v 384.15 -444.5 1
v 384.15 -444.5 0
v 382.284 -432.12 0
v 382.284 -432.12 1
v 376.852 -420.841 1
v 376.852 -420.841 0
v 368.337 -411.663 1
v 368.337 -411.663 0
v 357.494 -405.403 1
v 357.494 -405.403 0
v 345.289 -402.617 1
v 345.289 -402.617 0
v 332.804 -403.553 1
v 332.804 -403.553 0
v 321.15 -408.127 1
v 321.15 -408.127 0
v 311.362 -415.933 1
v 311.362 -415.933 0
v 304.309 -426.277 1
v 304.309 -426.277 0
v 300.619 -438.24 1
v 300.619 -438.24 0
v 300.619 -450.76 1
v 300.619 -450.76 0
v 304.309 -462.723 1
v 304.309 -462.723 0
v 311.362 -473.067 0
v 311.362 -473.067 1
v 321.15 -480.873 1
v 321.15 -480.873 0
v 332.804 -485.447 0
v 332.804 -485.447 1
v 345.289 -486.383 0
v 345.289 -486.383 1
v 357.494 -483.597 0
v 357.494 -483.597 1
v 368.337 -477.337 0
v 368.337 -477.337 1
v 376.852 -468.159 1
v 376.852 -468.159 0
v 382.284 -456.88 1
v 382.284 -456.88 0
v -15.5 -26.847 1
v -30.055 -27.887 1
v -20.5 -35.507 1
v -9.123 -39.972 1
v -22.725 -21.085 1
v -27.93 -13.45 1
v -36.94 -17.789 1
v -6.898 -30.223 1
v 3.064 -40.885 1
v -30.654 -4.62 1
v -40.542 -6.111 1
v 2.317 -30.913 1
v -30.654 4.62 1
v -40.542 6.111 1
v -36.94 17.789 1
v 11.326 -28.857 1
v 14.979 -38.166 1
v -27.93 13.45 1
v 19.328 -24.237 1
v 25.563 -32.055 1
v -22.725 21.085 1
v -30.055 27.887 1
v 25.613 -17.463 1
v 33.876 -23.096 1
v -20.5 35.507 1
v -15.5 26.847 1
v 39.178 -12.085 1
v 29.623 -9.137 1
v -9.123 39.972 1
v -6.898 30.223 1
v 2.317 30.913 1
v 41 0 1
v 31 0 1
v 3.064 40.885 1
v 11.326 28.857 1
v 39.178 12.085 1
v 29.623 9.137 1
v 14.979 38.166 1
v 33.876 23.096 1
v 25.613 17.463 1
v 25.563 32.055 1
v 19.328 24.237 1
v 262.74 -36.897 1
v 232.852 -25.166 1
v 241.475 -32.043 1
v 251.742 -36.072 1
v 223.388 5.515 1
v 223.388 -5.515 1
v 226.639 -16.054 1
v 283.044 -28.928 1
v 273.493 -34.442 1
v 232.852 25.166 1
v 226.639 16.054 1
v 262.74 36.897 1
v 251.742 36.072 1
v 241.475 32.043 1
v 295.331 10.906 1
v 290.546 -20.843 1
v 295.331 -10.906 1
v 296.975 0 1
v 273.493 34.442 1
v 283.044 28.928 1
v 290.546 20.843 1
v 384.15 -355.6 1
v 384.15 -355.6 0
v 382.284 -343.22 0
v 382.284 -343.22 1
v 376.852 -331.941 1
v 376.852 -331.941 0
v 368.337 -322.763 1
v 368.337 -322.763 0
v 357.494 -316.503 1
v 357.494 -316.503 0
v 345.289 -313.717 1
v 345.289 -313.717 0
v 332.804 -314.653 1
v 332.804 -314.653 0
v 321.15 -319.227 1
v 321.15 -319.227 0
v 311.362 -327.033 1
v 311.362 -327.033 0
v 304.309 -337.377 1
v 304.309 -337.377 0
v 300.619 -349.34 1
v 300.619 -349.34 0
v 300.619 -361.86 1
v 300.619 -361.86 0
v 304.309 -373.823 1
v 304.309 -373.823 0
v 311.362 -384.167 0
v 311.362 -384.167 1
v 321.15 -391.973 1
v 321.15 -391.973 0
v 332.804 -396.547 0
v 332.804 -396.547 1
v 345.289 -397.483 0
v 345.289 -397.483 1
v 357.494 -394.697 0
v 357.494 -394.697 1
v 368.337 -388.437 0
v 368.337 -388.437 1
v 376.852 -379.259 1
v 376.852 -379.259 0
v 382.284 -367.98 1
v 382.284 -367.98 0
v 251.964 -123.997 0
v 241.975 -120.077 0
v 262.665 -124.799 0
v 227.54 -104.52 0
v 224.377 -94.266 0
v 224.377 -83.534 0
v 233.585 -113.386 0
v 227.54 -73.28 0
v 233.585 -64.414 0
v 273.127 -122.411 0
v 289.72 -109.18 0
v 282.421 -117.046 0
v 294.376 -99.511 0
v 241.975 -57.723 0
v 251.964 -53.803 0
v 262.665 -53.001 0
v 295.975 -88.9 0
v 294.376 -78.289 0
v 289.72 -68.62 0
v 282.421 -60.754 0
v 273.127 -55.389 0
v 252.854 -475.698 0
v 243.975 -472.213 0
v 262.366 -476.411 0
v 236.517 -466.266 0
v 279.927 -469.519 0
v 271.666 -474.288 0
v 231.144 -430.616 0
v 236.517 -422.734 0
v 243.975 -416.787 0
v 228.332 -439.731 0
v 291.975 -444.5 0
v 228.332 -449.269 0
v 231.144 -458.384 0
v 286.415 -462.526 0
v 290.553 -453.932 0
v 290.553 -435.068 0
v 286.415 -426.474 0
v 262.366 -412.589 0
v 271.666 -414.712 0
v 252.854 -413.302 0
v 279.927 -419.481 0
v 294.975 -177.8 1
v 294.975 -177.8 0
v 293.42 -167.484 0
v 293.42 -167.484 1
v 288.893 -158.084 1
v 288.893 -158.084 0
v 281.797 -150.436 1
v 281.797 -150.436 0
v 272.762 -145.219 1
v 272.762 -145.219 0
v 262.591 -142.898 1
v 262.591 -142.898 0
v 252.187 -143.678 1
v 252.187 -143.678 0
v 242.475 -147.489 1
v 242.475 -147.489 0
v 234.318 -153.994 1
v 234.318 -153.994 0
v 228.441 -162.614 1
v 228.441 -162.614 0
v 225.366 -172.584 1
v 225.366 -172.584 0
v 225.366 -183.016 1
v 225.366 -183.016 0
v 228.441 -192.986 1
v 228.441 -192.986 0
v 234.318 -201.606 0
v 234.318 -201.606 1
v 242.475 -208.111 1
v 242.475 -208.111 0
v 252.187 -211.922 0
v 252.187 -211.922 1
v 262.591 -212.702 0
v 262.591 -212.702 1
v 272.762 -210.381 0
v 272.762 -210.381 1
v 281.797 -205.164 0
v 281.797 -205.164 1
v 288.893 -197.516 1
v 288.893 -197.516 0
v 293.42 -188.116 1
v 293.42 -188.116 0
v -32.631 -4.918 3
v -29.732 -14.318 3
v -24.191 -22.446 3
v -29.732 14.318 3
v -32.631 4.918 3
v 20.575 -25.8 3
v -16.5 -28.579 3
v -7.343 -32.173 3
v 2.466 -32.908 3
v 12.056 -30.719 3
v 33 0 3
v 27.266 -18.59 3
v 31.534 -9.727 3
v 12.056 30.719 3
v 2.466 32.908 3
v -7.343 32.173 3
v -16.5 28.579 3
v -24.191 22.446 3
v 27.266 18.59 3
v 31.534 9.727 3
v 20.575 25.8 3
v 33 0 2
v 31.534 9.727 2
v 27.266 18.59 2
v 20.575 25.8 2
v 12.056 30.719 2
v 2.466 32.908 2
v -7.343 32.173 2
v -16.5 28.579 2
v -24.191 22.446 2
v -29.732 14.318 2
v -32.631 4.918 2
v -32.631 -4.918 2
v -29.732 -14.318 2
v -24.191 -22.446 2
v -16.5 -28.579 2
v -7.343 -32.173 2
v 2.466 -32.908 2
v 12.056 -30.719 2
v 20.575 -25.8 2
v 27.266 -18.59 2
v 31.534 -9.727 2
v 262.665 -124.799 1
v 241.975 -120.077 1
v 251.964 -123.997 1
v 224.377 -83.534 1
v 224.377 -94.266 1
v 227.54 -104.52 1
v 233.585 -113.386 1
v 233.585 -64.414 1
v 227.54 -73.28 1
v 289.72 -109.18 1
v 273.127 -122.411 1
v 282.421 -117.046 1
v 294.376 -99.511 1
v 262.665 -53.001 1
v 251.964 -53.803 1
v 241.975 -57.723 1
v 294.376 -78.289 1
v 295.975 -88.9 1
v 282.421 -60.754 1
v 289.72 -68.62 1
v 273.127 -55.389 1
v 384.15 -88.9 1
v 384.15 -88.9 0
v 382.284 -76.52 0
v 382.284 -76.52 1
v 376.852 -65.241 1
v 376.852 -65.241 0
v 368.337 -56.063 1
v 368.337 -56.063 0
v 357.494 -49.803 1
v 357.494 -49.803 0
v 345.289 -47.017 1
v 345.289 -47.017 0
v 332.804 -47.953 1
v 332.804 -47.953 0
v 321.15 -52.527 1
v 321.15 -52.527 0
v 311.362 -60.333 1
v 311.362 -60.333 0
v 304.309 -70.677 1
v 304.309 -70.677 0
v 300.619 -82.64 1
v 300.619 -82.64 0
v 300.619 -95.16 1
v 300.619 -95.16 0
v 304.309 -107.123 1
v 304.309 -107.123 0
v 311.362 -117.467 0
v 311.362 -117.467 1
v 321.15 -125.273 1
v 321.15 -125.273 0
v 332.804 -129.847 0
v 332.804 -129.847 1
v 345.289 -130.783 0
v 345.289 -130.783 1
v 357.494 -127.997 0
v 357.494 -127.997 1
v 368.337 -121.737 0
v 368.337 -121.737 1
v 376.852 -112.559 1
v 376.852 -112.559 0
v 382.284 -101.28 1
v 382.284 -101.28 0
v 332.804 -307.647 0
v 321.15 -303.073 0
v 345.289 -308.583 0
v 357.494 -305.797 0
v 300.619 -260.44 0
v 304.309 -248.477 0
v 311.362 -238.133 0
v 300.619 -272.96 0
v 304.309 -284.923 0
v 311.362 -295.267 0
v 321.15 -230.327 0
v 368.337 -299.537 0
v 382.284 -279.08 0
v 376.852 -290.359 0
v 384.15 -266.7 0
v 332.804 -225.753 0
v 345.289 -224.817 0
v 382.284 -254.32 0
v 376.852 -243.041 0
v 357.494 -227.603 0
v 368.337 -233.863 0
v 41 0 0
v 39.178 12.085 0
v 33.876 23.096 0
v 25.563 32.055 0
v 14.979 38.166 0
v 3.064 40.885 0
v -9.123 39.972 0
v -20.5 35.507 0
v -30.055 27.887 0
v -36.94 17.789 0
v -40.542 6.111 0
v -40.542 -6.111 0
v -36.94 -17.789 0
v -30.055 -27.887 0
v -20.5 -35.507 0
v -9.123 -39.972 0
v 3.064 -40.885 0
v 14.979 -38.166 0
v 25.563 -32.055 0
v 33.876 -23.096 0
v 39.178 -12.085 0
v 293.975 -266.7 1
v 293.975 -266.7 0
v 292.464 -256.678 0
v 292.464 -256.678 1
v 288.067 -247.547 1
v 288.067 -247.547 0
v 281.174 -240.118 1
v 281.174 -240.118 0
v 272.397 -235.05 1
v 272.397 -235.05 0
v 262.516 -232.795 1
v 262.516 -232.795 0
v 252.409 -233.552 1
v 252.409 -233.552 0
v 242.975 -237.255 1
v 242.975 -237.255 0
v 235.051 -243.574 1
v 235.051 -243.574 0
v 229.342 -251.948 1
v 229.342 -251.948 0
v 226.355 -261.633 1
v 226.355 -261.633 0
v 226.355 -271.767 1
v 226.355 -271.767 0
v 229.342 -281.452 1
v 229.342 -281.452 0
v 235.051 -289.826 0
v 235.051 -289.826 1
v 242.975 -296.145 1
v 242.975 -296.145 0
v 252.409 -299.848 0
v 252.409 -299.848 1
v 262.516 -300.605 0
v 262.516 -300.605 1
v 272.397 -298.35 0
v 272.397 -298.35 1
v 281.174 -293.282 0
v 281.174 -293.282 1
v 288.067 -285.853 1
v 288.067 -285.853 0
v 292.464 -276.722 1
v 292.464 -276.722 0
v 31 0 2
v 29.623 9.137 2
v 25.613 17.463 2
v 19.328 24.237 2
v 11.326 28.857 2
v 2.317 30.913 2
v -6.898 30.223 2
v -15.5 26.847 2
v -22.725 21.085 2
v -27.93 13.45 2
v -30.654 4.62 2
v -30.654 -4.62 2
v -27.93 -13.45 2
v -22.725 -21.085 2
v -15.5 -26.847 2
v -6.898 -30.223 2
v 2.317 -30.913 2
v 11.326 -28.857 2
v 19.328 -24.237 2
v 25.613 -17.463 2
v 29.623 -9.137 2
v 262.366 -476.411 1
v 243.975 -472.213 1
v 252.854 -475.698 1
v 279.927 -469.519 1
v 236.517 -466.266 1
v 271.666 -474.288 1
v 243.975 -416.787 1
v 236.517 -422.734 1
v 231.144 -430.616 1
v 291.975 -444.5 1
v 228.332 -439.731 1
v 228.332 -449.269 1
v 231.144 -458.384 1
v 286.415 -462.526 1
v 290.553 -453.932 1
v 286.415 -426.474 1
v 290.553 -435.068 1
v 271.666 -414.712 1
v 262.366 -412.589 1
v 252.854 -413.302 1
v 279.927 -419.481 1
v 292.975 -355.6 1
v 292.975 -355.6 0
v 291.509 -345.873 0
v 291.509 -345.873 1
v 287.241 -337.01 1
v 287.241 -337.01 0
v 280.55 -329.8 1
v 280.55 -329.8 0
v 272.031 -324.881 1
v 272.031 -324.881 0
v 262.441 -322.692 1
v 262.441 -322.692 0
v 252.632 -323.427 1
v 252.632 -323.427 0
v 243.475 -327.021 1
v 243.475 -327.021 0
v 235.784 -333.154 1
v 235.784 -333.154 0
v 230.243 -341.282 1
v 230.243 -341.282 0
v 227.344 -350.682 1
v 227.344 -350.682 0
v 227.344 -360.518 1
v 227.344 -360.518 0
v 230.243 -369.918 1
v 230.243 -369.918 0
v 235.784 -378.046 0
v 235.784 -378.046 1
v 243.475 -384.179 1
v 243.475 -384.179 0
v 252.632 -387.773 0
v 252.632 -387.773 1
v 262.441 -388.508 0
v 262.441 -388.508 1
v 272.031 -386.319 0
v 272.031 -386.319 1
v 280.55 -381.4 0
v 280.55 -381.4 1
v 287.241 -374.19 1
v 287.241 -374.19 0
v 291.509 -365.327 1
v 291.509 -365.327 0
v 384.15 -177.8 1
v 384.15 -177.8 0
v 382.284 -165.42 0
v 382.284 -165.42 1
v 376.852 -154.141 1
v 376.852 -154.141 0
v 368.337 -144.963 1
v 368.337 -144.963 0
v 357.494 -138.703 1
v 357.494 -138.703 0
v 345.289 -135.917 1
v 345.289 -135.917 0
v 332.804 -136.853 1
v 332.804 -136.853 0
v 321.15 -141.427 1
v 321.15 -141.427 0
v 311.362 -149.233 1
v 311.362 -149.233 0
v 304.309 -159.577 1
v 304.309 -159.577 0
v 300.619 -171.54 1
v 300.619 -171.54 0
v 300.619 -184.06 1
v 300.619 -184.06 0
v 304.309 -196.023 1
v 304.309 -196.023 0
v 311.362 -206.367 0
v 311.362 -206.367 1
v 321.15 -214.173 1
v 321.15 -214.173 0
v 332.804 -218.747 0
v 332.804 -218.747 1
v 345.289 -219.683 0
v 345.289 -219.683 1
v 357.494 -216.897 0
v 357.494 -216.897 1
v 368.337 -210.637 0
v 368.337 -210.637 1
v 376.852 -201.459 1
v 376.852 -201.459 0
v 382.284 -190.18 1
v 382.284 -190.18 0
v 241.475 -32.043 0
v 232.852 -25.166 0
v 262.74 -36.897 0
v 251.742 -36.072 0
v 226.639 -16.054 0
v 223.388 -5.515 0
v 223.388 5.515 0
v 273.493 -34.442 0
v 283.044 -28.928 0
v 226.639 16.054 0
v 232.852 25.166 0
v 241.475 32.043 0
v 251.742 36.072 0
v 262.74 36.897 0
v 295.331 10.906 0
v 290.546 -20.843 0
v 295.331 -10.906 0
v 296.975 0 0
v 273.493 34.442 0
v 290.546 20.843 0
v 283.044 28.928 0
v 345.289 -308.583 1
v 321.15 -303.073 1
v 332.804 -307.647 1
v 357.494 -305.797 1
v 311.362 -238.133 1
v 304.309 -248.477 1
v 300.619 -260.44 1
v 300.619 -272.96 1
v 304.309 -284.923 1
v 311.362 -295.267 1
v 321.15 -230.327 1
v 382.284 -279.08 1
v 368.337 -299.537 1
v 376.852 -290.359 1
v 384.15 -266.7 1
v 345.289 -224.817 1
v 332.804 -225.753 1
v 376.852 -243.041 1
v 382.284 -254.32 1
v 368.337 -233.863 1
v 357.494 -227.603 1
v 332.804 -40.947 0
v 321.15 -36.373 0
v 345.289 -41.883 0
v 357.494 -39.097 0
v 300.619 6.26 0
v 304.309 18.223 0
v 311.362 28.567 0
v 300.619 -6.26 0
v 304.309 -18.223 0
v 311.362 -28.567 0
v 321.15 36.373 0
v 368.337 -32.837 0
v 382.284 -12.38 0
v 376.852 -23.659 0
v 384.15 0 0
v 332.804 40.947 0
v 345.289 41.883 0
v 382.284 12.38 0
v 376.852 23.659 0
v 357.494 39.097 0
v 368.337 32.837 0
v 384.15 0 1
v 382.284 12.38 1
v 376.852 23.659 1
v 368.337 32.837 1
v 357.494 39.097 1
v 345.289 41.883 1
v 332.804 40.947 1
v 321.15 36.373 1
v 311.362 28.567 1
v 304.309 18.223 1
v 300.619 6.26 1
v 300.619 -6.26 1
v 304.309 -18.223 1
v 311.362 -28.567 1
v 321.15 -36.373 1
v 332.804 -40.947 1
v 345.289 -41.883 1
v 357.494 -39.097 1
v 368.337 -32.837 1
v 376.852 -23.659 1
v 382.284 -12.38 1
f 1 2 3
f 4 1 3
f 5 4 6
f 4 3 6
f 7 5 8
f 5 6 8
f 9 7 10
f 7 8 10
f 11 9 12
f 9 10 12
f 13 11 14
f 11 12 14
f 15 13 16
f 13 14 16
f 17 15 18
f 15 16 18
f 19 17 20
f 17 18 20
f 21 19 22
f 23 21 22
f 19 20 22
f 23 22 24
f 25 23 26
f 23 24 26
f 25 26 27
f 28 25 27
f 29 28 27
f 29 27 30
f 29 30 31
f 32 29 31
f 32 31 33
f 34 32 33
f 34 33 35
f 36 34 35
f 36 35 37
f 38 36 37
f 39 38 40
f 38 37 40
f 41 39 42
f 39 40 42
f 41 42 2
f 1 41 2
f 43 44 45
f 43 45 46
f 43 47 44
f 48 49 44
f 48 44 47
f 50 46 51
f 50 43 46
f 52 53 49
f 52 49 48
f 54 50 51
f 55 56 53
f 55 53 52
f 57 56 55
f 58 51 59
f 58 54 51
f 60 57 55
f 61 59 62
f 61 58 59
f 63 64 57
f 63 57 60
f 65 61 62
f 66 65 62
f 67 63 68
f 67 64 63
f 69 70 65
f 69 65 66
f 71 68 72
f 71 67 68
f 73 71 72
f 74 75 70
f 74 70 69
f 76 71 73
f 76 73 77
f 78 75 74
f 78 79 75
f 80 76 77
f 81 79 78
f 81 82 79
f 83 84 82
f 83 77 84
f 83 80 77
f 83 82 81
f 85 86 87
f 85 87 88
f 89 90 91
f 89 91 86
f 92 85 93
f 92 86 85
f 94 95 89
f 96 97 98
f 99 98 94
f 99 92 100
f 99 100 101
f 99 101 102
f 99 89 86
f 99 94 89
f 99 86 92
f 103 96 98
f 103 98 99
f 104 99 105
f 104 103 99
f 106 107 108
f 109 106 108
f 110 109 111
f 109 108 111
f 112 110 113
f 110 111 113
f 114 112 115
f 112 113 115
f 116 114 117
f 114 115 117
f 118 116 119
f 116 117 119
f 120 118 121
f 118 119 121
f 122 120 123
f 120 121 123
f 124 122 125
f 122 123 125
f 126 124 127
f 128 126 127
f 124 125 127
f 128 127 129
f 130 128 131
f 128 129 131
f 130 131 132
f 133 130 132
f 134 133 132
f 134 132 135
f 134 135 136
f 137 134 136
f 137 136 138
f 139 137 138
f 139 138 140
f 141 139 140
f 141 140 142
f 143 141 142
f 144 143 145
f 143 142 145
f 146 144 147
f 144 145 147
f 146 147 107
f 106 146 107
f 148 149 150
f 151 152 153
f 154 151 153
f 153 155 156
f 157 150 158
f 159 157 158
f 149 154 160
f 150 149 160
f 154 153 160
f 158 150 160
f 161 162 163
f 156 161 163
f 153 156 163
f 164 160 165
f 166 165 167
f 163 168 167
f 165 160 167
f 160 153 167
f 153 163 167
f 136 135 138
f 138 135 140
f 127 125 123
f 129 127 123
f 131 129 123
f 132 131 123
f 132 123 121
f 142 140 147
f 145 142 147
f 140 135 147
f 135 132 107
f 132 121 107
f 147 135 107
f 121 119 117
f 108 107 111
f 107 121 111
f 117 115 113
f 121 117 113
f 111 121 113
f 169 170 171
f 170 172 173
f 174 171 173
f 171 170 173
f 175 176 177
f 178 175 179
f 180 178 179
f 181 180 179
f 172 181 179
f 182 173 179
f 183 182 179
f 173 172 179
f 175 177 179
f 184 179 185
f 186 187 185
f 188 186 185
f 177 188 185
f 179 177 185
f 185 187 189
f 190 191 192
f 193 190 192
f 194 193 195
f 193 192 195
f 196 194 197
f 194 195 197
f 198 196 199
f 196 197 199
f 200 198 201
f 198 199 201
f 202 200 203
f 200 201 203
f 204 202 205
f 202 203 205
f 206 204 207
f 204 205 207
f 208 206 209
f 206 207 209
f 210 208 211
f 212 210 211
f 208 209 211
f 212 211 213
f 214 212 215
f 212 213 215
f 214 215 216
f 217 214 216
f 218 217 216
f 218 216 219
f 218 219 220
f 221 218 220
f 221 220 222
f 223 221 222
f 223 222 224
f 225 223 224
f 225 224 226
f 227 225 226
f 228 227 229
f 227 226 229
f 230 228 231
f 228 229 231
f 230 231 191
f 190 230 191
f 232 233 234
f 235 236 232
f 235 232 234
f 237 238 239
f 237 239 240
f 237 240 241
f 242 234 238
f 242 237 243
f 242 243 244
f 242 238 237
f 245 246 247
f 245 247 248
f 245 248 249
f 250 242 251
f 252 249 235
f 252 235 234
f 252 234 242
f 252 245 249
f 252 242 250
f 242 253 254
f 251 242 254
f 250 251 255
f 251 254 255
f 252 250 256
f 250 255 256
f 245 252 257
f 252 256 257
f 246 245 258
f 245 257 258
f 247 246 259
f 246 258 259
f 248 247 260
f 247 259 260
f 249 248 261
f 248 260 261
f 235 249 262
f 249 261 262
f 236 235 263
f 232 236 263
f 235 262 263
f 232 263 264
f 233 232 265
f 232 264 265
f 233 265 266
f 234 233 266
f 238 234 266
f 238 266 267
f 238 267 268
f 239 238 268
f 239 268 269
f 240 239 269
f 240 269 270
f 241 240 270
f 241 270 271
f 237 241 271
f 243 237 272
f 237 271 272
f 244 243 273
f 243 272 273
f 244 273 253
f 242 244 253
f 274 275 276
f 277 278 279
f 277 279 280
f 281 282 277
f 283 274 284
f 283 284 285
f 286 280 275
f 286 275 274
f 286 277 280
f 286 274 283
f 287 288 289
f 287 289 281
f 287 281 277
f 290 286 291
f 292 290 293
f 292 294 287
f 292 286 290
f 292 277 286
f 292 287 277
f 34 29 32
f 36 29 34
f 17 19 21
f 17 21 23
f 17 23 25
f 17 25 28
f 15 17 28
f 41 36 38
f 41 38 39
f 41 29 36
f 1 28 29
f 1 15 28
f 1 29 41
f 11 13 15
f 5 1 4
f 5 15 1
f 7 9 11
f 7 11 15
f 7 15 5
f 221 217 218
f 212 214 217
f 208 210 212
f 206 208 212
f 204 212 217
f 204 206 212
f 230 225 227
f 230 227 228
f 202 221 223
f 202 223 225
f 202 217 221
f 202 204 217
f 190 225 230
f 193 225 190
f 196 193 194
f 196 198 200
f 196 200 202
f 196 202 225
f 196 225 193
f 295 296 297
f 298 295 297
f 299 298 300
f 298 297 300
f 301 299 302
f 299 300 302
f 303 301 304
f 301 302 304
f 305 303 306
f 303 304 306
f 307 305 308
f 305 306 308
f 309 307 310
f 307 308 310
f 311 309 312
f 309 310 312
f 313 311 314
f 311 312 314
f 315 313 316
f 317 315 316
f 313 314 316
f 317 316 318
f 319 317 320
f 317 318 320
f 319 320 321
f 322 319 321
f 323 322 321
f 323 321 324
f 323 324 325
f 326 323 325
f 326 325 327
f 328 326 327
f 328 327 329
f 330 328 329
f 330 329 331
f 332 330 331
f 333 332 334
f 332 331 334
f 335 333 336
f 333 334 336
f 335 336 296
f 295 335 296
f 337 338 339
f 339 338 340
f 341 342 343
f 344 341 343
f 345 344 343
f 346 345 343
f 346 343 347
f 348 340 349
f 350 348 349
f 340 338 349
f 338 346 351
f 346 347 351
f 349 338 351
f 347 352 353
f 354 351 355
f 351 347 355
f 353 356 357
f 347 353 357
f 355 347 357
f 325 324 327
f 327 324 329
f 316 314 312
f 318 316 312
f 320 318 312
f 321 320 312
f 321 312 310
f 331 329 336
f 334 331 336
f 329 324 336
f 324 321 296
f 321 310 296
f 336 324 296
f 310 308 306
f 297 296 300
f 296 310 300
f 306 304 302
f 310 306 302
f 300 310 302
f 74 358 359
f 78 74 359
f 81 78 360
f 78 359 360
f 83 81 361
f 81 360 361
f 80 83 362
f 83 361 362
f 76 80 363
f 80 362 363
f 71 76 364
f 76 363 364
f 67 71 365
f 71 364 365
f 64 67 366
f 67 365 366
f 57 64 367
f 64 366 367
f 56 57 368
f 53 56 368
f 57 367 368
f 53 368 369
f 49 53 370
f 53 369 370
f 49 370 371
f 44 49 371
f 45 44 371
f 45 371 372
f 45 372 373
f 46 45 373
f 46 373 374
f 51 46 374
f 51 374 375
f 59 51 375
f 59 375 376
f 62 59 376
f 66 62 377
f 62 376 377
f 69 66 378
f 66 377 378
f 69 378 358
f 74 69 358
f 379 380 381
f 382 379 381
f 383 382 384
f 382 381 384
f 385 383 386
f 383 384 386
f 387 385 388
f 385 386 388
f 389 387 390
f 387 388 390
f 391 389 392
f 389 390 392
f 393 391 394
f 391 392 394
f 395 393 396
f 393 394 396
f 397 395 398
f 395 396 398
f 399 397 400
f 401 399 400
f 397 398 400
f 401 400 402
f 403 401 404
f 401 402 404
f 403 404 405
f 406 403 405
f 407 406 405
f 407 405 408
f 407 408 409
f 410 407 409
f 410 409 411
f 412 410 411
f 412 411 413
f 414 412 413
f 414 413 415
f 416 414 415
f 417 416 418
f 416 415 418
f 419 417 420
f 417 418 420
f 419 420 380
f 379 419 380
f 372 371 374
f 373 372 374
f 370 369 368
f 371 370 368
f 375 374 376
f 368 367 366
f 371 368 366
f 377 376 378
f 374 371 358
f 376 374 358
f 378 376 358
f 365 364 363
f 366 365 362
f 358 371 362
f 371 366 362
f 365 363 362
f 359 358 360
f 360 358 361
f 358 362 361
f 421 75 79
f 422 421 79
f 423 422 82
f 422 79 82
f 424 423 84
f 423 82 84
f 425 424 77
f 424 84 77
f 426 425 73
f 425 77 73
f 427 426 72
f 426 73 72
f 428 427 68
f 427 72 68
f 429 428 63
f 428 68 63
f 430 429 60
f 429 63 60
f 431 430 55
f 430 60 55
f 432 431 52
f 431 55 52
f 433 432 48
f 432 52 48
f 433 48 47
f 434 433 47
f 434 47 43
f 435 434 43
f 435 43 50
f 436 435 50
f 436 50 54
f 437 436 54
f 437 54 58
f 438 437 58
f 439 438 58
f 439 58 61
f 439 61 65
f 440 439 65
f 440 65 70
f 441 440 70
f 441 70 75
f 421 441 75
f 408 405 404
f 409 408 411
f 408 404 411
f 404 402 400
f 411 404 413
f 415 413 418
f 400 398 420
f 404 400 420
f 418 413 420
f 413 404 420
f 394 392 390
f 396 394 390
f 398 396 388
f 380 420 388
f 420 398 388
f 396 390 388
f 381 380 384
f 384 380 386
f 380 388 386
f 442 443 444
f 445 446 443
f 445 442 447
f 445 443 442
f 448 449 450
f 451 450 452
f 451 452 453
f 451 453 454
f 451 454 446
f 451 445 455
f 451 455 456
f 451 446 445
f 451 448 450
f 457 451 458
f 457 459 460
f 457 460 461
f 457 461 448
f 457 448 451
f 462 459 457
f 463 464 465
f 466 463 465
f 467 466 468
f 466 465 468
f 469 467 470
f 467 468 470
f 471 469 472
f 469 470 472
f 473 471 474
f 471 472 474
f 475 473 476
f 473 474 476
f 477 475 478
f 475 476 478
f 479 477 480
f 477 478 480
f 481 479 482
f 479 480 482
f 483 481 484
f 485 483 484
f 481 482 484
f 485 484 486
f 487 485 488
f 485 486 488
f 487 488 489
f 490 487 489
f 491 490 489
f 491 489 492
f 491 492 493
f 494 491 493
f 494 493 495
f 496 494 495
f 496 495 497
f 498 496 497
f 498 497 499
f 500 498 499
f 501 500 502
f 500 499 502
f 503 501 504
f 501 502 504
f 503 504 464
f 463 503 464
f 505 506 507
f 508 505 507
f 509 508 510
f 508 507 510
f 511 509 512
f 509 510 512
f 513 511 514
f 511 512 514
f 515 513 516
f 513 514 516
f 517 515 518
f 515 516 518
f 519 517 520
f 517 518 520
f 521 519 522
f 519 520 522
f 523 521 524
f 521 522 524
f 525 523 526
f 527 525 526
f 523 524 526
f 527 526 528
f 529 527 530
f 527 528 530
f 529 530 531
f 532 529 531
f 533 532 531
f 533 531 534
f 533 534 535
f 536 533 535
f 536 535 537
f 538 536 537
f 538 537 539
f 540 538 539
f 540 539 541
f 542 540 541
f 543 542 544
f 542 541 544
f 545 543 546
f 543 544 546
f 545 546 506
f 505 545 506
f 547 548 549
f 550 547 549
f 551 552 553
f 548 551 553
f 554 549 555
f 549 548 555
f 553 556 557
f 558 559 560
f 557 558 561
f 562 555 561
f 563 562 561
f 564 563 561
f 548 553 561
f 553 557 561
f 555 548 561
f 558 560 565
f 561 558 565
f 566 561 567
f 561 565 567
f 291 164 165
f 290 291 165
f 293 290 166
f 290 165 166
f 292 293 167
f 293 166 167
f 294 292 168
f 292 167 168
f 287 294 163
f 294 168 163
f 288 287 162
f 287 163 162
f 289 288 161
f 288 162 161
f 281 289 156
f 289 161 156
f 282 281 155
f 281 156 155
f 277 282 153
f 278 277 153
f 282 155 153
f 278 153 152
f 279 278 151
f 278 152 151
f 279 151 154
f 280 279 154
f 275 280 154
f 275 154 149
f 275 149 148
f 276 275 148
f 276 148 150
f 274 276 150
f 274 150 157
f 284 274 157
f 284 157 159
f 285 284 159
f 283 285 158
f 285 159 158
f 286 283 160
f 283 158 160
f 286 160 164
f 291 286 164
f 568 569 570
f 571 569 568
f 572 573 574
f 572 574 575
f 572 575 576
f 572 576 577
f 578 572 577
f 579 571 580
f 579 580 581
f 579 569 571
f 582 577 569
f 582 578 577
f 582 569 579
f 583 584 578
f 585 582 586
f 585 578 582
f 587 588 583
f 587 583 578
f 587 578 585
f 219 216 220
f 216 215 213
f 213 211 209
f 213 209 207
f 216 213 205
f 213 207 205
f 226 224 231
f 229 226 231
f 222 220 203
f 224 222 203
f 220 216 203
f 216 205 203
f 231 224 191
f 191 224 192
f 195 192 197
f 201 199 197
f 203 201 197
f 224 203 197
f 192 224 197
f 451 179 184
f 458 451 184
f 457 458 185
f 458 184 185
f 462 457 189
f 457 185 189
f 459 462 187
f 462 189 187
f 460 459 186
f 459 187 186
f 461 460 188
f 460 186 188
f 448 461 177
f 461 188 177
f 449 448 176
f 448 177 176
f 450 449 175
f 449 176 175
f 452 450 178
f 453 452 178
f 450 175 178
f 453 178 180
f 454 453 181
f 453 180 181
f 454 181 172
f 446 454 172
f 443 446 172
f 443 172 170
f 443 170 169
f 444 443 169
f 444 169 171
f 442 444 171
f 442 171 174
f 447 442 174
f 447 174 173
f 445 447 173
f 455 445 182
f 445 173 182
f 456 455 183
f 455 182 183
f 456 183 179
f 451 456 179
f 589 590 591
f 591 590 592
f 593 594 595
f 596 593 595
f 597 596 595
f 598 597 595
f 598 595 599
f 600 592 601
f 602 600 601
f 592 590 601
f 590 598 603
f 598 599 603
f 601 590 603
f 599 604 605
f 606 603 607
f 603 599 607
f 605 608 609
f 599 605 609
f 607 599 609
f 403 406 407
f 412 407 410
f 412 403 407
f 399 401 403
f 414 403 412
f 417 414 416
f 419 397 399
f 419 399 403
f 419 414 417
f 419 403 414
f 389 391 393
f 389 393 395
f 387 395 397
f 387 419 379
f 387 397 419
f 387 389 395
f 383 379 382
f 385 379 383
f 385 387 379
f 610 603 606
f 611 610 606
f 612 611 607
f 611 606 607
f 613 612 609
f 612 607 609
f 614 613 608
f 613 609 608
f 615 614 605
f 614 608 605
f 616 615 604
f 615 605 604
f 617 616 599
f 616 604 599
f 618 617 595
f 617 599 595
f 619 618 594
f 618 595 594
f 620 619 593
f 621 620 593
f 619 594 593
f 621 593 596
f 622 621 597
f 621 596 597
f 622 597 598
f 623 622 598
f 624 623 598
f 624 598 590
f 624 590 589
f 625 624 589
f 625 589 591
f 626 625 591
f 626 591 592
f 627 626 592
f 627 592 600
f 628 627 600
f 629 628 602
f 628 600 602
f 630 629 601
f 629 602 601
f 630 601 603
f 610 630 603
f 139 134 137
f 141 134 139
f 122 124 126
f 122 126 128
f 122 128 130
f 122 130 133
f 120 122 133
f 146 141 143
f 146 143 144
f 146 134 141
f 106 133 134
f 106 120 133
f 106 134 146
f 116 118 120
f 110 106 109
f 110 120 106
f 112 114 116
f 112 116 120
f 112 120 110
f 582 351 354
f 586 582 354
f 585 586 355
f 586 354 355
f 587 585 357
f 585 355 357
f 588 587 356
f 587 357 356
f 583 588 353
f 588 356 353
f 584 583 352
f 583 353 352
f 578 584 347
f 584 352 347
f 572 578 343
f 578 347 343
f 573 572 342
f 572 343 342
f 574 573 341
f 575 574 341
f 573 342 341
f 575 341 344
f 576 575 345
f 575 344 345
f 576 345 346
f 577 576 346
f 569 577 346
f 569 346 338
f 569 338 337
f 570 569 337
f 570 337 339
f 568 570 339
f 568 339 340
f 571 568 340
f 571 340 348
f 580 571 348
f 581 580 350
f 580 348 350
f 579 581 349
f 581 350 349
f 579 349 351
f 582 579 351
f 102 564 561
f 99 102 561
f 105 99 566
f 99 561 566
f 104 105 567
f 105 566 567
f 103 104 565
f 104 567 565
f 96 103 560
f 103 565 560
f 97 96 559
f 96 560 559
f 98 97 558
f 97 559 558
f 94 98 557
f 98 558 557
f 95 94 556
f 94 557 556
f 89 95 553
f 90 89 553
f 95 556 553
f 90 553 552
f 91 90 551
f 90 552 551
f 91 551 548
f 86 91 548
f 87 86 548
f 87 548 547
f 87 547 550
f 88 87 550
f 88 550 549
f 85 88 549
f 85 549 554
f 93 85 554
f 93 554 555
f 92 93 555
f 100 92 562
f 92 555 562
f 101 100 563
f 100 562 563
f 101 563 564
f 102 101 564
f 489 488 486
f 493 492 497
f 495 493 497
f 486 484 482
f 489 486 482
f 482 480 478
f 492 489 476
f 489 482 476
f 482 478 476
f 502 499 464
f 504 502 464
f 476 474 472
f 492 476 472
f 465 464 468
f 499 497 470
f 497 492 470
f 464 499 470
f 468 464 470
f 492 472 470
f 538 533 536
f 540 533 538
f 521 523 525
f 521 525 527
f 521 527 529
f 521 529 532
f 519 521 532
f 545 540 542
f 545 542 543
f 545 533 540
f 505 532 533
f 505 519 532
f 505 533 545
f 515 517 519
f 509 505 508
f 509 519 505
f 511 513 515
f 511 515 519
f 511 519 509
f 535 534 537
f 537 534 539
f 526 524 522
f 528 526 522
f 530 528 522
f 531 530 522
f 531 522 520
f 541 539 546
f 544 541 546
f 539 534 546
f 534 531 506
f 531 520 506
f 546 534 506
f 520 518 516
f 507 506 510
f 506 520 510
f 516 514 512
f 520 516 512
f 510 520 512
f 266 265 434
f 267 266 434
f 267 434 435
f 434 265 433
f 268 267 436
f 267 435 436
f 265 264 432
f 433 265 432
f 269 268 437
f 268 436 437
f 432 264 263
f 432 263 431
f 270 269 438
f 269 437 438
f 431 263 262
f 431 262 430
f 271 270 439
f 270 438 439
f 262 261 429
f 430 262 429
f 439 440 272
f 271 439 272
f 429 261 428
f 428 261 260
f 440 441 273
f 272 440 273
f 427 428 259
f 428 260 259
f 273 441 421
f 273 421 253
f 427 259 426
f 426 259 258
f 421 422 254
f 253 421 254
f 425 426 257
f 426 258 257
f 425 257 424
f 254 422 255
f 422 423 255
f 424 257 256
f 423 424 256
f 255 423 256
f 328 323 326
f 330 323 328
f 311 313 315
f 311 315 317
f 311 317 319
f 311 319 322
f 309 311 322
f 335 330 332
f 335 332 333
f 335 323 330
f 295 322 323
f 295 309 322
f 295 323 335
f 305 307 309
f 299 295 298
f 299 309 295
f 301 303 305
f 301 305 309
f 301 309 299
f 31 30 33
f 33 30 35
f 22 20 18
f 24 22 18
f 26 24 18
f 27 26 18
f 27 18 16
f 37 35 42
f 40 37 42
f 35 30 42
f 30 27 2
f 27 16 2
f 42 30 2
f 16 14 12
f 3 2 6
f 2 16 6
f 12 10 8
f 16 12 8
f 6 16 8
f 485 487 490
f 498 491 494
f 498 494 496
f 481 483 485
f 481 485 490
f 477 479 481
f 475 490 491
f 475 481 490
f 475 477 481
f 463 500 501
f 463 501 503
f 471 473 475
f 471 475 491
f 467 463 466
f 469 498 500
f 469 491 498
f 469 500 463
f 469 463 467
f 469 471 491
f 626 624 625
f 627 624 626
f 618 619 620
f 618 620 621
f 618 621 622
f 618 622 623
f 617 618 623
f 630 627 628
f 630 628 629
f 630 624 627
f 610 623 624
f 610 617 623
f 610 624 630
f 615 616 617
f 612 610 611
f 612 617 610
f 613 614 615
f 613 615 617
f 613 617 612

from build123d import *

# Parameters (mm, degrees)
F1_DEPTH  = 1
F2_R      = 37
F2_R_2    = 42
F2_R_3    = 36
F2_R_4    = 35
F2_R_5    = 34
F2_R_6    = 33
F2_R_7    = 32
F3_DEPTH  = 1
F4_R      = 42
F4_R_2    = 37
F4_R_3    = 36
F4_R_4    = 35
F4_R_5    = 34
F4_R_6    = 33
F4_R_7    = 32
F5_DEPTH  = 1
F7_R      = 41
F7_R_2    = 33
F7_R_3    = 31
F8_DEPTH  = 1
F9_DEPTH  = 2
F10_R     = 33
F11_DEPTH = 1


with BuildPart() as f1:
    # F0 (on Top) → F1 (new body)
    with BuildSketch(Plane.XY):
        with BuildLine():
            Line((2.5, -36.915444), (2.5, -41.925529))
            ThreePointArc((2.5, -41.925529), (0, 42), (-2.5, -41.925529))
            Line((-2.5, -41.925529), (-2.5, -36.915444))
            ThreePointArc((-2.5, -36.915444), (0, 37), (2.5, -36.915444))
        make_face()
        with BuildLine():
            Line((92.4, -36.834087), (92.4, -41.853913))
            ThreePointArc((92.4, -41.853913), (88.9, 42), (85.4, -41.853913))
            Line((85.4, -41.853913), (85.4, -36.834087))
            ThreePointArc((85.4, -36.834087), (88.9, 37), (92.4, -36.834087))
        make_face()
        with BuildLine():
            Line((182.3, -36.725332), (182.3, -41.758233))
            ThreePointArc((182.3, -41.758233), (177.8, 42), (173.3, -41.758233))
            Line((173.3, -41.758233), (173.3, -36.725332))
            ThreePointArc((173.3, -36.725332), (177.8, 37), (182.3, -36.725332))
        make_face()
        with BuildLine():
            Line((92.4, -124.729457), (92.4, -130.753913))
            ThreePointArc((92.4, -130.753913), (88.9, -46.9), (85.4, -130.753913))
            Line((85.4, -130.753913), (85.4, -124.729457))
            ThreePointArc((85.4, -124.729457), (88.9, -52.9), (92.4, -124.729457))
        make_face()
        with BuildLine():
            Line((182.3, -124.617643), (182.3, -130.658233))
            ThreePointArc((182.3, -130.658233), (177.8, -46.9), (173.3, -130.658233))
            Line((173.3, -130.658233), (173.3, -124.617643))
            ThreePointArc((173.3, -124.617643), (177.8, -52.9), (182.3, -124.617643))
        make_face()
        with BuildLine():
            Line((2.5, -124.81309), (2.5, -130.825529))
            ThreePointArc((2.5, -130.825529), (0, -46.9), (-2.5, -130.825529))
            Line((-2.5, -130.825529), (-2.5, -125.815444))
            Line((-2.5, -125.815444), (-2.5, -124.81309))
            ThreePointArc((-2.5, -124.81309), (0, -52.9), (2.5, -124.81309))
        make_face()
        with BuildLine():
            Line((92.4, -212.62456), (92.4, -219.653913))
            ThreePointArc((92.4, -219.653913), (88.9, -135.8), (85.4, -219.653913))
            Line((85.4, -219.653913), (85.4, -212.62456))
            ThreePointArc((85.4, -212.62456), (88.9, -142.8), (92.4, -212.62456))
        make_face()
        with BuildLine():
            Line((182.3, -212.509509), (182.3, -219.558233))
            ThreePointArc((182.3, -219.558233), (177.8, -135.8), (173.3, -219.558233))
            Line((173.3, -219.558233), (173.3, -212.509509))
            ThreePointArc((173.3, -212.509509), (177.8, -142.8), (182.3, -212.509509))
        make_face()
        with BuildLine():
            Line((2.5, -212.7106), (2.5, -219.725529))
            ThreePointArc((2.5, -219.725529), (0, -135.8), (-2.5, -219.725529))
            Line((-2.5, -219.725529), (-2.5, -212.7106))
            ThreePointArc((-2.5, -212.7106), (0, -142.8), (2.5, -212.7106))
        make_face()
        with BuildLine():
            Line((92.4, -300.519373), (92.4, -308.553913))
            ThreePointArc((92.4, -308.553913), (88.9, -224.7), (85.4, -308.553913))
            Line((85.4, -308.553913), (85.4, -300.519373))
            ThreePointArc((85.4, -300.519373), (88.9, -232.7), (92.4, -300.519373))
        make_face()
        with BuildLine():
            Line((182.3, -300.40089), (182.3, -308.458233))
            ThreePointArc((182.3, -308.458233), (177.8, -224.7), (173.3, -308.458233))
            Line((173.3, -308.458233), (173.3, -300.40089))
            ThreePointArc((173.3, -300.40089), (177.8, -232.7), (182.3, -300.40089))
        make_face()
        with BuildLine():
            Line((2.5, -300.607964), (2.5, -308.625529))
            ThreePointArc((2.5, -308.625529), (0, -224.7), (-2.5, -308.625529))
            Line((-2.5, -308.625529), (-2.5, -300.607964))
            ThreePointArc((-2.5, -300.607964), (0, -232.7), (2.5, -300.607964))
        make_face()
        with BuildLine():
            Line((92.4, -388.413869), (92.4, -397.453913))
            ThreePointArc((92.4, -397.453913), (88.9, -313.6), (85.4, -397.453913))
            Line((85.4, -397.453913), (85.4, -388.413869))
            ThreePointArc((85.4, -388.413869), (88.9, -322.6), (92.4, -388.413869))
        make_face()
        with BuildLine():
            Line((182.3, -388.291742), (182.3, -397.358233))
            ThreePointArc((182.3, -397.358233), (177.8, -313.6), (173.3, -397.358233))
            Line((173.3, -397.358233), (173.3, -388.291742))
            ThreePointArc((173.3, -388.291742), (177.8, -322.6), (182.3, -388.291742))
        make_face()
        with BuildLine():
            Line((2.5, -388.505167), (2.5, -397.525529))
            ThreePointArc((2.5, -397.525529), (0, -313.6), (-2.5, -397.525529))
            Line((-2.5, -397.525529), (-2.5, -388.505167))
            ThreePointArc((-2.5, -388.505167), (0, -322.6), (2.5, -388.505167))
        make_face()
        with BuildLine():
            Line((92.4, -476.308018), (92.4, -486.353913))
            ThreePointArc((92.4, -486.353913), (88.9, -402.5), (85.4, -486.353913))
            Line((85.4, -486.353913), (85.4, -476.308018))
            ThreePointArc((85.4, -476.308018), (88.9, -412.5), (92.4, -476.308018))
        make_face()
        with BuildLine():
            Line((182.3, -476.182014), (182.3, -486.258233))
            ThreePointArc((182.3, -486.258233), (177.8, -402.5), (173.3, -486.258233))
            Line((173.3, -486.258233), (173.3, -476.182014))
            ThreePointArc((173.3, -476.182014), (177.8, -412.5), (182.3, -476.182014))
        make_face()
        with BuildLine():
            Line((2.5, -476.402194), (2.5, -486.425529))
            ThreePointArc((2.5, -486.425529), (0, -402.5), (-2.5, -486.425529))
            Line((-2.5, -486.425529), (-2.5, -476.402194))
            ThreePointArc((-2.5, -476.402194), (0, -412.5), (2.5, -476.402194))
        make_face()
    extrude(amount=F1_DEPTH)


with BuildPart() as f3:
    # F2 (on Top) → F3 (new body)
    with BuildSketch(Plane.XY):
        with Locations((259.975, 0)):
            Circle(F2_R)
        with Locations((342.15, 0)):
            Circle(F2_R_2)
        with Locations((342.15, -88.9)):
            Circle(F2_R_2)
        with Locations((342.15, -177.8)):
            Circle(F2_R_2)
        with Locations((342.15, -266.7)):
            Circle(F2_R_2)
        with Locations((342.15, -355.6)):
            Circle(F2_R_2)
        with Locations((342.15, -444.5)):
            Circle(F2_R_2)
        with Locations((259.975, -88.9)):
            Circle(F2_R_3)
        with Locations((259.975, -177.8)):
            Circle(F2_R_4)
        with Locations((259.975, -266.7)):
            Circle(F2_R_5)
        with Locations((259.975, -355.6)):
            Circle(F2_R_6)
        with Locations((259.975, -444.5)):
            Circle(F2_R_7)
    extrude(amount=F3_DEPTH)


with BuildPart() as f5:
    # F4 (on Top) → F5 (new body)
    with BuildSketch(Plane.XY):
        with Locations((-89.461, 0)):
            Circle(F4_R)
        with Locations((-89.461, 0)):
            Circle(F4_R_2, mode=Mode.SUBTRACT)
        with Locations((-89.461, -88.9)):
            Circle(F4_R)
        with Locations((-89.461, -88.9)):
            Circle(F4_R_3, mode=Mode.SUBTRACT)
        with Locations((-89.461, -177.8)):
            Circle(F4_R)
        with Locations((-89.461, -177.8)):
            Circle(F4_R_4, mode=Mode.SUBTRACT)
        with Locations((-89.461, -266.7)):
            Circle(F4_R)
        with Locations((-89.461, -266.7)):
            Circle(F4_R_5, mode=Mode.SUBTRACT)
        with Locations((-89.461, -355.6)):
            Circle(F4_R)
        with Locations((-89.461, -355.6)):
            Circle(F4_R_6, mode=Mode.SUBTRACT)
        with Locations((-89.461, -444.5)):
            Circle(F4_R)
        with Locations((-89.461, -444.5)):
            Circle(F4_R_7, mode=Mode.SUBTRACT)
    extrude(amount=F5_DEPTH)


with BuildPart() as f8:
    # F7 (on Top) → F8 (new body)
    with BuildSketch(Plane.XY):
        Circle(F7_R)
        Circle(F7_R_2, mode=Mode.SUBTRACT)
        Circle(F7_R_3)
        Circle(F7_R_2)
        Circle(F7_R_3, mode=Mode.SUBTRACT)
    extrude(amount=F8_DEPTH)

    # F7 (on Top) → F9 (join)
    with BuildSketch(Plane.XY):
        Circle(F7_R_3)
    extrude(amount=F9_DEPTH)

    # F10 (on face) → F11 (join)
    with BuildSketch(Plane.XY.offset(2)):
        Circle(F10_R)
    extrude(amount=F11_DEPTH)


solid = Compound([f3.part, f8.part])
